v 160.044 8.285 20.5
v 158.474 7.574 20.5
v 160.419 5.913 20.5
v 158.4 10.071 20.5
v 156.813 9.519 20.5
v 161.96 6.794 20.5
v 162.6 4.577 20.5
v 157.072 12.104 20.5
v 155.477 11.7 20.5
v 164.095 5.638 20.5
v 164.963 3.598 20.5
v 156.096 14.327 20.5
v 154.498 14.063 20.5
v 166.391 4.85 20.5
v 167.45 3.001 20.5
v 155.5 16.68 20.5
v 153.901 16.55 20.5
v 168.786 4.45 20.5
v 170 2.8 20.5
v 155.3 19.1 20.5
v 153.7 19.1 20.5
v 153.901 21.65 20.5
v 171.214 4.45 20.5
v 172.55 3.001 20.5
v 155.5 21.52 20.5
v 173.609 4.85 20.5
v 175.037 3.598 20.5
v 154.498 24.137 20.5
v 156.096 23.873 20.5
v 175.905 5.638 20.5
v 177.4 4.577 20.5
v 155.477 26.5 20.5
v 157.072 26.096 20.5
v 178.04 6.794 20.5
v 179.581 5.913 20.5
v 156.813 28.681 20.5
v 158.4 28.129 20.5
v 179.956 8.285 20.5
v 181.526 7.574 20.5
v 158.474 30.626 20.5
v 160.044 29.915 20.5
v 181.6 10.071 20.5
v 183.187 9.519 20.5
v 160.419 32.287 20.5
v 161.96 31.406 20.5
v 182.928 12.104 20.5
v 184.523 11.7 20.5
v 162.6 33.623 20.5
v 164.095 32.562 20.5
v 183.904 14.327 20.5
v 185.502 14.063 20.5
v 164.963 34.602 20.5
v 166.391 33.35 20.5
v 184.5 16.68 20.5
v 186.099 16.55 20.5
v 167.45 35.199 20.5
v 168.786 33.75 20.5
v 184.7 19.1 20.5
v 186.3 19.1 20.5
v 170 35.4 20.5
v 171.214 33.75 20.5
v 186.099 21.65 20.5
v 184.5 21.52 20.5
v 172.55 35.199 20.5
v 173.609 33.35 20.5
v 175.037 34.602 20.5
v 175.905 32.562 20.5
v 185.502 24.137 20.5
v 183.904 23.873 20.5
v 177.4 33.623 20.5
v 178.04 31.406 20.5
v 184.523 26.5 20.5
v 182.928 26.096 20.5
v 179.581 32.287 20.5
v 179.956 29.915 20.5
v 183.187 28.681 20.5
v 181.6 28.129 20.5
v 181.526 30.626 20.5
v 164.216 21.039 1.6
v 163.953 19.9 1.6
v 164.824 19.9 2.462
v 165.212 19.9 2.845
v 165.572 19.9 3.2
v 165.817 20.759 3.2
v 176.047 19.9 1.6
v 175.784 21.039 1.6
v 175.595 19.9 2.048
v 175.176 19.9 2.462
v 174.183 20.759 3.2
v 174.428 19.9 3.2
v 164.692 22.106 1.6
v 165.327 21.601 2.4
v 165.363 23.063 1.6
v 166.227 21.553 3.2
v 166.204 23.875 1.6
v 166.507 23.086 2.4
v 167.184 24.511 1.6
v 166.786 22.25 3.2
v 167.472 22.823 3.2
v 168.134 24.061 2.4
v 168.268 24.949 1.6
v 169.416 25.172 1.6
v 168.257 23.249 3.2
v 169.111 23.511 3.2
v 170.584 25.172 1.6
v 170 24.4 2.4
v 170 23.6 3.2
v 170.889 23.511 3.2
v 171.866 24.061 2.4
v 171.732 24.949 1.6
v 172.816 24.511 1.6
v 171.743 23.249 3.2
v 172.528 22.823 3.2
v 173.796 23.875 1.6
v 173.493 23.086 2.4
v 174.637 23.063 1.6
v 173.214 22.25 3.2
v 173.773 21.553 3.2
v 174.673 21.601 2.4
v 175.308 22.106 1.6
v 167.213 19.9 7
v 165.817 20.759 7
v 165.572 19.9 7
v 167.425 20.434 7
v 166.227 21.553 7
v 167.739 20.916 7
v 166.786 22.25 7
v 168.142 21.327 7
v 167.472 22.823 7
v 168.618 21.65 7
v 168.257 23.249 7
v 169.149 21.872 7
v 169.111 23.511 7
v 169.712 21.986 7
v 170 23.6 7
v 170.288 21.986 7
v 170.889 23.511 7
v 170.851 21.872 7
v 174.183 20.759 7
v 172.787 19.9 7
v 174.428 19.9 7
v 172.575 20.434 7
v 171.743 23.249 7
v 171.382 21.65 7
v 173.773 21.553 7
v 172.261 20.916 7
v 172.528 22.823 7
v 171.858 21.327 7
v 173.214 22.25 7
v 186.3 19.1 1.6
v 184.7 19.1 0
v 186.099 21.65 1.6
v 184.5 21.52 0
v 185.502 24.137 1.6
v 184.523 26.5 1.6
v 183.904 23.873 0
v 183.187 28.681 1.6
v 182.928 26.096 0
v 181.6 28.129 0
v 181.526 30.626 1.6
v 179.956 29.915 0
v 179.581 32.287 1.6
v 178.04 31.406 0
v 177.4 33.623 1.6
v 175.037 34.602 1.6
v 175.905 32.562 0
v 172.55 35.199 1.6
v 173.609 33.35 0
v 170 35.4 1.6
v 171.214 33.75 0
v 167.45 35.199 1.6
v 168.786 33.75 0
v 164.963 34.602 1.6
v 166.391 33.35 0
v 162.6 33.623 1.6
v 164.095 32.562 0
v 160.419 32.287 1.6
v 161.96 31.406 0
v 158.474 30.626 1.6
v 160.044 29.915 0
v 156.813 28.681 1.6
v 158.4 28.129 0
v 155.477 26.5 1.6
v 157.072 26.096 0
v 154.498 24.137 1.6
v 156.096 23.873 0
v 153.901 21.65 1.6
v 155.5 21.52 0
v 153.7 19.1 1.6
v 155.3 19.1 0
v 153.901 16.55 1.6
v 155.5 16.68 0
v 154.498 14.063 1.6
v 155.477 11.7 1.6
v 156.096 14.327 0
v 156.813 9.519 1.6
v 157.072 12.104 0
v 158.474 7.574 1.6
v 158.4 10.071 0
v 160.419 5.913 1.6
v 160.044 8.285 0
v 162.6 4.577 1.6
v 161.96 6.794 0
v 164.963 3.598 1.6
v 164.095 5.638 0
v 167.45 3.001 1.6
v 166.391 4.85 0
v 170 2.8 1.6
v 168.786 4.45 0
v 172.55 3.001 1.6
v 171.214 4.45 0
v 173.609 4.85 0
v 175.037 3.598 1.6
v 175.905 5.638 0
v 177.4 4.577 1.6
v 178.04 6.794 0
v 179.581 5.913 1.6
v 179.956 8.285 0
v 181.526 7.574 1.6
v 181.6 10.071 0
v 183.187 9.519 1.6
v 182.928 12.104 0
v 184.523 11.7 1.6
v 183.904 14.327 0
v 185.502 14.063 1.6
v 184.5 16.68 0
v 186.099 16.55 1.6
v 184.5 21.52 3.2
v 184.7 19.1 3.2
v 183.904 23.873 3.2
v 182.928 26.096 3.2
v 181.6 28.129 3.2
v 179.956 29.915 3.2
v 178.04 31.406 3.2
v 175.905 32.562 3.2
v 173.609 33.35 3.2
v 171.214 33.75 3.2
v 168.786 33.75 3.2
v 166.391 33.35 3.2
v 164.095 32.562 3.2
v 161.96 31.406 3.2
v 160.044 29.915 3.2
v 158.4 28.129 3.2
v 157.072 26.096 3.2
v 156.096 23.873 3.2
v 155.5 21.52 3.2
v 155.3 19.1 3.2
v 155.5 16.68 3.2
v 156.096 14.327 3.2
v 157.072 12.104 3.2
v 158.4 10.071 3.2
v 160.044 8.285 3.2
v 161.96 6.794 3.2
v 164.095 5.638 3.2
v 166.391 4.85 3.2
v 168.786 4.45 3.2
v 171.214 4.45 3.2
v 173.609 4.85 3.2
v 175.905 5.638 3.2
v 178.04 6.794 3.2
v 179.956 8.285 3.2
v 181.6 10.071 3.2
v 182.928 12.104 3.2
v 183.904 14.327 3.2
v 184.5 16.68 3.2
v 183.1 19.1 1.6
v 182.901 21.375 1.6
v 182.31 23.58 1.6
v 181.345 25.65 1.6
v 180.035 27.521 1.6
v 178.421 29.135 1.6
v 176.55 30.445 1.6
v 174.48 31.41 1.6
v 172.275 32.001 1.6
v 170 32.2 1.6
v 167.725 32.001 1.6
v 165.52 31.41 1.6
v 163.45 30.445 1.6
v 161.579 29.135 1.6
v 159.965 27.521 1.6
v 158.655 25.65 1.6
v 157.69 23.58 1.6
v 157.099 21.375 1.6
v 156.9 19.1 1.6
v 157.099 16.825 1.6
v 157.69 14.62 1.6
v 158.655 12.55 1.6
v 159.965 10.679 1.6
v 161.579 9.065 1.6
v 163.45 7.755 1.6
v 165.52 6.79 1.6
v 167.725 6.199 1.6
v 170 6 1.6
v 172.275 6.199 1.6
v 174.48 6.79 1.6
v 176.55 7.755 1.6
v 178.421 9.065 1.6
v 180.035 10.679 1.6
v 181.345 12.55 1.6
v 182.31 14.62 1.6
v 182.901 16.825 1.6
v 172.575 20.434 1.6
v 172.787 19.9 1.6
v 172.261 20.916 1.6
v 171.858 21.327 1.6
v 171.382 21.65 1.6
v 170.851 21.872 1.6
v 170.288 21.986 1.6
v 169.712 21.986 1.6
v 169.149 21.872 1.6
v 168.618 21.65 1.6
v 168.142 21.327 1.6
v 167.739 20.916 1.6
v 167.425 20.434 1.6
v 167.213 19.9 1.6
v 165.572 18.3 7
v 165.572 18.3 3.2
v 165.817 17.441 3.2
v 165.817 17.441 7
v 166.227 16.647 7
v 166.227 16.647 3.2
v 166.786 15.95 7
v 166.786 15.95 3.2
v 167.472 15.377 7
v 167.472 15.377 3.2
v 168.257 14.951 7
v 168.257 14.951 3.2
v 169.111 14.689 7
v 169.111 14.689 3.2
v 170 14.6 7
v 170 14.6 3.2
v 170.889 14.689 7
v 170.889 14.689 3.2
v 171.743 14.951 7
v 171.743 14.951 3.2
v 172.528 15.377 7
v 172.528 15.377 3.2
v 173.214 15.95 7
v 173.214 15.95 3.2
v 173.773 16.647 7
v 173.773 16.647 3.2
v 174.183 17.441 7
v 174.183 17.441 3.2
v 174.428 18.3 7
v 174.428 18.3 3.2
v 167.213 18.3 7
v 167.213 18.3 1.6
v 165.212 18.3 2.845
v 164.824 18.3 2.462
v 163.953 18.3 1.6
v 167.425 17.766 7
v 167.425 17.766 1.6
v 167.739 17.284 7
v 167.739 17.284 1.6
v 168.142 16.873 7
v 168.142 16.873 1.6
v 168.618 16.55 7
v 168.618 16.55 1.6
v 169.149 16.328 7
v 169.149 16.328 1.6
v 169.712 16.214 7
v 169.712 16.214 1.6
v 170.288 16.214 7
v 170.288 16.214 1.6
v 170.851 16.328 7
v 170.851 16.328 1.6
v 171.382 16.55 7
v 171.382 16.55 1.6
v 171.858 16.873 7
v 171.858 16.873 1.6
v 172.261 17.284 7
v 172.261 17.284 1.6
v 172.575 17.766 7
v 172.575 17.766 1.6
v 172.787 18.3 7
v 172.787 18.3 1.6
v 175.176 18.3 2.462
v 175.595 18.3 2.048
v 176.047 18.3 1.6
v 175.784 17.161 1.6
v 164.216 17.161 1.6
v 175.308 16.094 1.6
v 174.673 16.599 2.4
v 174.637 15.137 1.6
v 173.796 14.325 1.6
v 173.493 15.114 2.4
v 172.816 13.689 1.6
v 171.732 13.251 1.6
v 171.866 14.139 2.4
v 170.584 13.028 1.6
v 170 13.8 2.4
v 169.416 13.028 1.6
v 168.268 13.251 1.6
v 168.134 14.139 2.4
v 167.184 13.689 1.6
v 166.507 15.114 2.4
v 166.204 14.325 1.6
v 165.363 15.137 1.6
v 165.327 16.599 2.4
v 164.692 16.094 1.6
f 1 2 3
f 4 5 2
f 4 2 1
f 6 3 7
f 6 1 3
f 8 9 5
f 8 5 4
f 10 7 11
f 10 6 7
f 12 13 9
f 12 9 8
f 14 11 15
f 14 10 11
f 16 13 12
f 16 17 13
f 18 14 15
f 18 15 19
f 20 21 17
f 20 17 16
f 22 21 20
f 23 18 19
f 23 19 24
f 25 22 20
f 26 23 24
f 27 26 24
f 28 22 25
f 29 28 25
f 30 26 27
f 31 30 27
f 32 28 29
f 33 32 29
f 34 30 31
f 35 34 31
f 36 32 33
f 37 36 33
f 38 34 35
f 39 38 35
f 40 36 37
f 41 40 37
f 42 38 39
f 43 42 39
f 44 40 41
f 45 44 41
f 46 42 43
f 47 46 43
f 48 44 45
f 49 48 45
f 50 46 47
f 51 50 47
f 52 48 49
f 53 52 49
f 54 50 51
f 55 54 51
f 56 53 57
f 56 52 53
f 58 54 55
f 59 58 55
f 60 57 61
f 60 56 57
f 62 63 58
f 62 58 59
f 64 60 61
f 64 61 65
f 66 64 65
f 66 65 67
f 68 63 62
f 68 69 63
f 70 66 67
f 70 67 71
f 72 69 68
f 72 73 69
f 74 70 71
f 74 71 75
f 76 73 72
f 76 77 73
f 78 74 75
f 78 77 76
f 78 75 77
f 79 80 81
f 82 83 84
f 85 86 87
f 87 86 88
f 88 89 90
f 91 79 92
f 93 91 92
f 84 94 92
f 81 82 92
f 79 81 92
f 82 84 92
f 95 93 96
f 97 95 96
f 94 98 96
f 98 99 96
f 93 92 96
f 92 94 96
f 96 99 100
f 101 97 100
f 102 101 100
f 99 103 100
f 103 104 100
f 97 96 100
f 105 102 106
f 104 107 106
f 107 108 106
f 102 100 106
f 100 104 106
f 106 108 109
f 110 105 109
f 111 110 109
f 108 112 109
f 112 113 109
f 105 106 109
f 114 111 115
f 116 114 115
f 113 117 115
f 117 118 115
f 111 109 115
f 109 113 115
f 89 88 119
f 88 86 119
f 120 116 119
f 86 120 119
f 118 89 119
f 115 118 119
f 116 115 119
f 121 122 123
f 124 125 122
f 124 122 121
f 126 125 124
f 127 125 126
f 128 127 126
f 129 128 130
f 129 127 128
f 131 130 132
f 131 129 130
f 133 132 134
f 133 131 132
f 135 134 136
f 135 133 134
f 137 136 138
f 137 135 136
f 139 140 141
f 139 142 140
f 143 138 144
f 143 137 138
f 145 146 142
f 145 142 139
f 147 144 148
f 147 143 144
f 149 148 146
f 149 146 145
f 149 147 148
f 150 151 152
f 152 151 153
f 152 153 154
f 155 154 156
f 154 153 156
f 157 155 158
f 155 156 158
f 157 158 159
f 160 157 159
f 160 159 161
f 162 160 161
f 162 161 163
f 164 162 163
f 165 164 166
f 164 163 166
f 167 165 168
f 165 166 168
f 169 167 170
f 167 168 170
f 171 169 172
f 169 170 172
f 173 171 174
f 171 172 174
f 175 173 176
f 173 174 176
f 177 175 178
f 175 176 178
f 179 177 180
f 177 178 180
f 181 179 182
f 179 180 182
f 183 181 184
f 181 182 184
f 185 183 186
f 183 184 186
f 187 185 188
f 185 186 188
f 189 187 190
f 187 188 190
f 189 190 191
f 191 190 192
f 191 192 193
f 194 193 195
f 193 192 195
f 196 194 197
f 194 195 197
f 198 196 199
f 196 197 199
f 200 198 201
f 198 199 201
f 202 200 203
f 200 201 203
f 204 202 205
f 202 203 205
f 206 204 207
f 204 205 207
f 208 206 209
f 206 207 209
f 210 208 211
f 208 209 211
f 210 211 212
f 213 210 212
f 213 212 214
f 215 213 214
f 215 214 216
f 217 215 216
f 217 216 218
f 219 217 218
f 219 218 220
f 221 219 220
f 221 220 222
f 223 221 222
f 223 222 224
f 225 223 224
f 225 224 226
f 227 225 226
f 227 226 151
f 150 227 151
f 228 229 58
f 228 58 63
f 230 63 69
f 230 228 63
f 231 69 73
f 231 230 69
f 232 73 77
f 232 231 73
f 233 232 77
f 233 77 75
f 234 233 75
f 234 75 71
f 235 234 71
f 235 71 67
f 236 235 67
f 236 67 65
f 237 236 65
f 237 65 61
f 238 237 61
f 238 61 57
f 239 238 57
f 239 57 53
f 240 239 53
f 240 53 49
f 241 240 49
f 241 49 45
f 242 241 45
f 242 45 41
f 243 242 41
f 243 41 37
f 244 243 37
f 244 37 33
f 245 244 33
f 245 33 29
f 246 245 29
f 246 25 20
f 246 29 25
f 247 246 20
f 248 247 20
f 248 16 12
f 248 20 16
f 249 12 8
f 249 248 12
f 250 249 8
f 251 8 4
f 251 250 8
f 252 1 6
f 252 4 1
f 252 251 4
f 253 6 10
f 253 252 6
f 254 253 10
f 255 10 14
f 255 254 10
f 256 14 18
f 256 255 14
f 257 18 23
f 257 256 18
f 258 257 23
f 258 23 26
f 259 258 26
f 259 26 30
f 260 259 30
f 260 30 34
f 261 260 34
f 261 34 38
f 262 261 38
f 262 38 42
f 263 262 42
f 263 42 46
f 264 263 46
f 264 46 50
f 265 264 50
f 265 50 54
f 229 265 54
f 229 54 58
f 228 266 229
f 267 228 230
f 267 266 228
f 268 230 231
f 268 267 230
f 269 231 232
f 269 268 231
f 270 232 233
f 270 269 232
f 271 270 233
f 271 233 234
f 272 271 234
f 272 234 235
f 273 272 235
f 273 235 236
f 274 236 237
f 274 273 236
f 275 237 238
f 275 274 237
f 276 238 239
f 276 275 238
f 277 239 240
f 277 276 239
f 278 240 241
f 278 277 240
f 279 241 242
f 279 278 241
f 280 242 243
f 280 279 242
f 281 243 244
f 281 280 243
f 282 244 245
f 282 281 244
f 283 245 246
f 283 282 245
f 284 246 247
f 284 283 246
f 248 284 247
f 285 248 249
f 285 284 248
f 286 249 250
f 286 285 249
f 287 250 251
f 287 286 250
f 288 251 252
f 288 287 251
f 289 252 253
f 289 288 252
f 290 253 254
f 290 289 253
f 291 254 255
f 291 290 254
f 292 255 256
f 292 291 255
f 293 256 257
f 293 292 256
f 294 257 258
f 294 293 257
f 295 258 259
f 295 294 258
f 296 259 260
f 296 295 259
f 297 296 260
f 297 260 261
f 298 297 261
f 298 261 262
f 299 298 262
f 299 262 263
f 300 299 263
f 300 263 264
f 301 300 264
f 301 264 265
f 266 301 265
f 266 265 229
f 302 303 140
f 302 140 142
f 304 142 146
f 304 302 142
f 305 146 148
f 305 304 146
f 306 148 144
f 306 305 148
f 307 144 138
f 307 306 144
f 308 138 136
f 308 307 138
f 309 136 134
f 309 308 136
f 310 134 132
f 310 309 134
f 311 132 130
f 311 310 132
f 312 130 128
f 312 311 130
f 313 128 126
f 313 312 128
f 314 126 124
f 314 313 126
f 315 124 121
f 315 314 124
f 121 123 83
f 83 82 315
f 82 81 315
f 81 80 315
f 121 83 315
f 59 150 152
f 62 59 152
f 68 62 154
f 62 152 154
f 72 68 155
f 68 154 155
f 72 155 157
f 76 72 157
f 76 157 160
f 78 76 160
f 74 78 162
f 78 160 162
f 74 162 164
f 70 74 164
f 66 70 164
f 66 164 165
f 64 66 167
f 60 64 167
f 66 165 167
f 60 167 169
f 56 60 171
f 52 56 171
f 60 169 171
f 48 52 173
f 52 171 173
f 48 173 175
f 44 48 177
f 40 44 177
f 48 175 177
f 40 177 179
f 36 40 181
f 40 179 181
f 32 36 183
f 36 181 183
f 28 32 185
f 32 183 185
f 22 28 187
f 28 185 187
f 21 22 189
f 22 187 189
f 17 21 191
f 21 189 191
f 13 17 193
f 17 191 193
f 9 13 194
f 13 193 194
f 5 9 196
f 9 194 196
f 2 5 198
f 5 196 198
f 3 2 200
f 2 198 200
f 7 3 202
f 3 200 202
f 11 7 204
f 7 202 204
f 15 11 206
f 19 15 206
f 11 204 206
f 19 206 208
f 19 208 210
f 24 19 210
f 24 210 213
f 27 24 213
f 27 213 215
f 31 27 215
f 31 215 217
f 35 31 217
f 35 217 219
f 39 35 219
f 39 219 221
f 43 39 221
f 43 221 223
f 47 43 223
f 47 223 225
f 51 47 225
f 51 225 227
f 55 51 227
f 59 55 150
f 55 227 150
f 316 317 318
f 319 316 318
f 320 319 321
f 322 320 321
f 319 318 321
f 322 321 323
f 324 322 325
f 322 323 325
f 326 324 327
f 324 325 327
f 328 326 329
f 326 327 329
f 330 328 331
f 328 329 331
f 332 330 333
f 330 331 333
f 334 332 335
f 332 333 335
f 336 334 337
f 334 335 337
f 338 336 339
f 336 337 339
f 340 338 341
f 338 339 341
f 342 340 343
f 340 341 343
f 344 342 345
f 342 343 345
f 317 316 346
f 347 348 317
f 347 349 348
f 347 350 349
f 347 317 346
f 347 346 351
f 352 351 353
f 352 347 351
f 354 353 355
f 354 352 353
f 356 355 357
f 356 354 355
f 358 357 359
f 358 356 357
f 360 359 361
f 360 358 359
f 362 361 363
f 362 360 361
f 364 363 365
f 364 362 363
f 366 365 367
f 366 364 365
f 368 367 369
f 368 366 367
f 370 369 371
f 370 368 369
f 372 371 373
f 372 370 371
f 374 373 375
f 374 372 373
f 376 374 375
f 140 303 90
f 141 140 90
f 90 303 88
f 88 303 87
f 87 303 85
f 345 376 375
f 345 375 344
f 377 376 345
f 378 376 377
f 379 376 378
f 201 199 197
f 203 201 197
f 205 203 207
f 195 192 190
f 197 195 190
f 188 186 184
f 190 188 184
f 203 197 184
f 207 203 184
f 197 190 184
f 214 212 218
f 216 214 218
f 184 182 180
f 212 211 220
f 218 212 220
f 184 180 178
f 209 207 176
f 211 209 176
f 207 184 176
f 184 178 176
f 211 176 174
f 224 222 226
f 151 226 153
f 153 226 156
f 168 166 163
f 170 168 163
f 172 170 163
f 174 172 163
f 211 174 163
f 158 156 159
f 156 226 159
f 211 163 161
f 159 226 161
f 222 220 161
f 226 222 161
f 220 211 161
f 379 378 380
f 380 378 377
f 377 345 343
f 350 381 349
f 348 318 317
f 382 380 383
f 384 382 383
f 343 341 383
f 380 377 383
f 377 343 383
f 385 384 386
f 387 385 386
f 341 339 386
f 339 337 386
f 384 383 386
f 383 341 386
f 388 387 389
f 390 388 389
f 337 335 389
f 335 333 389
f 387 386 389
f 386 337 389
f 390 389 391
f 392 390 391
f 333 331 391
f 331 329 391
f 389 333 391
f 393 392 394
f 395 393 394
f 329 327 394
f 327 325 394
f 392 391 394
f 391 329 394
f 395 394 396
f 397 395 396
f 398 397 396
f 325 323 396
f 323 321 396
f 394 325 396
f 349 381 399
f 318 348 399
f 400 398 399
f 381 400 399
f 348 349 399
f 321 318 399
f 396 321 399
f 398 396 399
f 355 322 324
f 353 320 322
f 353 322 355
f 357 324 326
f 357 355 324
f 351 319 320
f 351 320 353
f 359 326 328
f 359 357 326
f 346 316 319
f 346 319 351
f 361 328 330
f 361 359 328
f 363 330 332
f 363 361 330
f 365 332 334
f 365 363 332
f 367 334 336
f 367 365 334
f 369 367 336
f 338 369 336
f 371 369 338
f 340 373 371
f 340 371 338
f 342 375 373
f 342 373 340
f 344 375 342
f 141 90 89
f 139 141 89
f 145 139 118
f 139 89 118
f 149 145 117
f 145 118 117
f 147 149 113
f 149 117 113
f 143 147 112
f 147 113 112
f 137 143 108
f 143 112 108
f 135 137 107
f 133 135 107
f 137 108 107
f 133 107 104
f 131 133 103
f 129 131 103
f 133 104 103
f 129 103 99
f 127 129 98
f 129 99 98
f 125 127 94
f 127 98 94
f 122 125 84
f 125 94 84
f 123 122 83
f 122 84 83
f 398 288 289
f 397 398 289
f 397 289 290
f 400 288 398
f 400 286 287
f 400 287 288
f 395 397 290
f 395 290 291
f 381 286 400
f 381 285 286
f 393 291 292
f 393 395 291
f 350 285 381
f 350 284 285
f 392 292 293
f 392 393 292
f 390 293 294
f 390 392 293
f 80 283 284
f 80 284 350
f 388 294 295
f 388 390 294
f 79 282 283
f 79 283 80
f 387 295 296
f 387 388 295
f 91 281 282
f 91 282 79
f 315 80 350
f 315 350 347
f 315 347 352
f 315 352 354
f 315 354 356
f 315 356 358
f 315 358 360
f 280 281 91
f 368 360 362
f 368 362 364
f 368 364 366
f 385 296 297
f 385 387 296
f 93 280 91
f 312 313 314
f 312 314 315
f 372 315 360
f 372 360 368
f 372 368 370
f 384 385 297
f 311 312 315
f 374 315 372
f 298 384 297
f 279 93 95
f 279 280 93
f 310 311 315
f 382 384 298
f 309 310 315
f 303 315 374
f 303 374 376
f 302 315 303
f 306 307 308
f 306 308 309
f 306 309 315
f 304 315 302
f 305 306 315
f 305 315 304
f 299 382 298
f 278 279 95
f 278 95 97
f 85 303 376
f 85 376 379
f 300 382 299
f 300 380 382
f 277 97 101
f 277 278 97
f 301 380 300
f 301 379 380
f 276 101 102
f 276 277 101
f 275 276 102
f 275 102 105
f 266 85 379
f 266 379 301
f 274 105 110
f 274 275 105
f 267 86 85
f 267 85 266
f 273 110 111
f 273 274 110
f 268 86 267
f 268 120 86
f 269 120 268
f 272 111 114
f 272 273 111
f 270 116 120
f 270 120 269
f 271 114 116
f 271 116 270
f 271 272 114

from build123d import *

# Parameters (mm, degrees)
BOX014_W          = 15
BOX014_H          = 1.6
BOX014_DEPTH      = 10.5
CYLINDER024_R     = 2.9
CYLINDER024_DEPTH = 10.5
CYLINDER023_R     = 4.5
CYLINDER023_DEPTH = 7
CYLINDER022_R     = 14.7
CYLINDER022_DEPTH = 20.5
CYLINDER021_R     = 16.3
CYLINDER021_DEPTH = 20.5
CHAMFER010_SIZE   = 1.6
CHAMFER011_SIZE   = 1.6
CHAMFER012_SIZE   = 1.6


with BuildPart() as w_rfel014:
    # Box014 → Box014 (new body)
    with BuildSketch(Plane(origin=(123, 18.3, 1.6), x_dir=(1, 0, 0), z_dir=(0, 0, 1))):
        with Locations((7.5, 0.8)):
            Rectangle(BOX014_W, BOX014_H)
    extrude(amount=BOX014_DEPTH)


with BuildPart() as zylinder024:
    # Cylinder024 → Cylinder024 (new body)
    with BuildSketch(Plane(origin=(130, 19.1, 1.6), x_dir=(1, 0, 0), z_dir=(0, 0, 1))):
        Circle(CYLINDER024_R)
    extrude(amount=CYLINDER024_DEPTH)


with BuildPart() as cut016:
    # Cylinder023 → Cylinder023 (new body)
    with BuildSketch(Plane(origin=(130, 19.1, 0), x_dir=(1, 0, 0), z_dir=(0, 0, 1))):
        Circle(CYLINDER023_R)
    extrude(amount=CYLINDER023_DEPTH)

    # Cut016: cut Zylinder024
    add(zylinder024.part, mode=Mode.SUBTRACT)


with BuildPart() as zylinder022:
    # Cylinder022 → Cylinder022 (new body)
    with BuildSketch(Plane(origin=(130, 19.1, 1.6), x_dir=(1, 0, 0), z_dir=(0, 0, 1))):
        Circle(CYLINDER022_R)
    extrude(amount=CYLINDER022_DEPTH)


with BuildPart() as knob_big:
    # Cylinder021 → Cylinder021 (new body)
    with BuildSketch(Plane(origin=(130, 19.1, 0), x_dir=(1, 0, 0), z_dir=(0, 0, 1))):
        Circle(CYLINDER021_R)
    extrude(amount=CYLINDER021_DEPTH)

    # Cut015: cut Zylinder022
    add(zylinder022.part, mode=Mode.SUBTRACT)

    # Chamfer010
    chamfer010_edges = [knob_big.edges().sort_by_distance(p)[0] for p in [
        (115.3, 19.1, 1.6),
    ]]
    chamfer(chamfer010_edges, length=CHAMFER010_SIZE)

    # Chamfer011
    chamfer011_edges = [knob_big.edges().sort_by_distance(p)[0] for p in [
        (113.7, 19.1, 0),
    ]]
    chamfer(chamfer011_edges, length=CHAMFER011_SIZE)

    # Fusion014: union Cut016
    add(cut016.part)

    # Chamfer012
    chamfer012_edges = [knob_big.edges().sort_by_distance(p)[0] for p in [
        (125.5, 19.1, 1.6),
    ]]
    chamfer(chamfer012_edges, length=CHAMFER012_SIZE)

    # Cut017: cut Würfel014
    add(w_rfel014.part, mode=Mode.SUBTRACT)


with BuildPart() as knob_big_1:
    # Cut017 placement: moved
    add(knob_big.part.moved(Location((40, 0, 0))))


solid = knob_big_1.part
